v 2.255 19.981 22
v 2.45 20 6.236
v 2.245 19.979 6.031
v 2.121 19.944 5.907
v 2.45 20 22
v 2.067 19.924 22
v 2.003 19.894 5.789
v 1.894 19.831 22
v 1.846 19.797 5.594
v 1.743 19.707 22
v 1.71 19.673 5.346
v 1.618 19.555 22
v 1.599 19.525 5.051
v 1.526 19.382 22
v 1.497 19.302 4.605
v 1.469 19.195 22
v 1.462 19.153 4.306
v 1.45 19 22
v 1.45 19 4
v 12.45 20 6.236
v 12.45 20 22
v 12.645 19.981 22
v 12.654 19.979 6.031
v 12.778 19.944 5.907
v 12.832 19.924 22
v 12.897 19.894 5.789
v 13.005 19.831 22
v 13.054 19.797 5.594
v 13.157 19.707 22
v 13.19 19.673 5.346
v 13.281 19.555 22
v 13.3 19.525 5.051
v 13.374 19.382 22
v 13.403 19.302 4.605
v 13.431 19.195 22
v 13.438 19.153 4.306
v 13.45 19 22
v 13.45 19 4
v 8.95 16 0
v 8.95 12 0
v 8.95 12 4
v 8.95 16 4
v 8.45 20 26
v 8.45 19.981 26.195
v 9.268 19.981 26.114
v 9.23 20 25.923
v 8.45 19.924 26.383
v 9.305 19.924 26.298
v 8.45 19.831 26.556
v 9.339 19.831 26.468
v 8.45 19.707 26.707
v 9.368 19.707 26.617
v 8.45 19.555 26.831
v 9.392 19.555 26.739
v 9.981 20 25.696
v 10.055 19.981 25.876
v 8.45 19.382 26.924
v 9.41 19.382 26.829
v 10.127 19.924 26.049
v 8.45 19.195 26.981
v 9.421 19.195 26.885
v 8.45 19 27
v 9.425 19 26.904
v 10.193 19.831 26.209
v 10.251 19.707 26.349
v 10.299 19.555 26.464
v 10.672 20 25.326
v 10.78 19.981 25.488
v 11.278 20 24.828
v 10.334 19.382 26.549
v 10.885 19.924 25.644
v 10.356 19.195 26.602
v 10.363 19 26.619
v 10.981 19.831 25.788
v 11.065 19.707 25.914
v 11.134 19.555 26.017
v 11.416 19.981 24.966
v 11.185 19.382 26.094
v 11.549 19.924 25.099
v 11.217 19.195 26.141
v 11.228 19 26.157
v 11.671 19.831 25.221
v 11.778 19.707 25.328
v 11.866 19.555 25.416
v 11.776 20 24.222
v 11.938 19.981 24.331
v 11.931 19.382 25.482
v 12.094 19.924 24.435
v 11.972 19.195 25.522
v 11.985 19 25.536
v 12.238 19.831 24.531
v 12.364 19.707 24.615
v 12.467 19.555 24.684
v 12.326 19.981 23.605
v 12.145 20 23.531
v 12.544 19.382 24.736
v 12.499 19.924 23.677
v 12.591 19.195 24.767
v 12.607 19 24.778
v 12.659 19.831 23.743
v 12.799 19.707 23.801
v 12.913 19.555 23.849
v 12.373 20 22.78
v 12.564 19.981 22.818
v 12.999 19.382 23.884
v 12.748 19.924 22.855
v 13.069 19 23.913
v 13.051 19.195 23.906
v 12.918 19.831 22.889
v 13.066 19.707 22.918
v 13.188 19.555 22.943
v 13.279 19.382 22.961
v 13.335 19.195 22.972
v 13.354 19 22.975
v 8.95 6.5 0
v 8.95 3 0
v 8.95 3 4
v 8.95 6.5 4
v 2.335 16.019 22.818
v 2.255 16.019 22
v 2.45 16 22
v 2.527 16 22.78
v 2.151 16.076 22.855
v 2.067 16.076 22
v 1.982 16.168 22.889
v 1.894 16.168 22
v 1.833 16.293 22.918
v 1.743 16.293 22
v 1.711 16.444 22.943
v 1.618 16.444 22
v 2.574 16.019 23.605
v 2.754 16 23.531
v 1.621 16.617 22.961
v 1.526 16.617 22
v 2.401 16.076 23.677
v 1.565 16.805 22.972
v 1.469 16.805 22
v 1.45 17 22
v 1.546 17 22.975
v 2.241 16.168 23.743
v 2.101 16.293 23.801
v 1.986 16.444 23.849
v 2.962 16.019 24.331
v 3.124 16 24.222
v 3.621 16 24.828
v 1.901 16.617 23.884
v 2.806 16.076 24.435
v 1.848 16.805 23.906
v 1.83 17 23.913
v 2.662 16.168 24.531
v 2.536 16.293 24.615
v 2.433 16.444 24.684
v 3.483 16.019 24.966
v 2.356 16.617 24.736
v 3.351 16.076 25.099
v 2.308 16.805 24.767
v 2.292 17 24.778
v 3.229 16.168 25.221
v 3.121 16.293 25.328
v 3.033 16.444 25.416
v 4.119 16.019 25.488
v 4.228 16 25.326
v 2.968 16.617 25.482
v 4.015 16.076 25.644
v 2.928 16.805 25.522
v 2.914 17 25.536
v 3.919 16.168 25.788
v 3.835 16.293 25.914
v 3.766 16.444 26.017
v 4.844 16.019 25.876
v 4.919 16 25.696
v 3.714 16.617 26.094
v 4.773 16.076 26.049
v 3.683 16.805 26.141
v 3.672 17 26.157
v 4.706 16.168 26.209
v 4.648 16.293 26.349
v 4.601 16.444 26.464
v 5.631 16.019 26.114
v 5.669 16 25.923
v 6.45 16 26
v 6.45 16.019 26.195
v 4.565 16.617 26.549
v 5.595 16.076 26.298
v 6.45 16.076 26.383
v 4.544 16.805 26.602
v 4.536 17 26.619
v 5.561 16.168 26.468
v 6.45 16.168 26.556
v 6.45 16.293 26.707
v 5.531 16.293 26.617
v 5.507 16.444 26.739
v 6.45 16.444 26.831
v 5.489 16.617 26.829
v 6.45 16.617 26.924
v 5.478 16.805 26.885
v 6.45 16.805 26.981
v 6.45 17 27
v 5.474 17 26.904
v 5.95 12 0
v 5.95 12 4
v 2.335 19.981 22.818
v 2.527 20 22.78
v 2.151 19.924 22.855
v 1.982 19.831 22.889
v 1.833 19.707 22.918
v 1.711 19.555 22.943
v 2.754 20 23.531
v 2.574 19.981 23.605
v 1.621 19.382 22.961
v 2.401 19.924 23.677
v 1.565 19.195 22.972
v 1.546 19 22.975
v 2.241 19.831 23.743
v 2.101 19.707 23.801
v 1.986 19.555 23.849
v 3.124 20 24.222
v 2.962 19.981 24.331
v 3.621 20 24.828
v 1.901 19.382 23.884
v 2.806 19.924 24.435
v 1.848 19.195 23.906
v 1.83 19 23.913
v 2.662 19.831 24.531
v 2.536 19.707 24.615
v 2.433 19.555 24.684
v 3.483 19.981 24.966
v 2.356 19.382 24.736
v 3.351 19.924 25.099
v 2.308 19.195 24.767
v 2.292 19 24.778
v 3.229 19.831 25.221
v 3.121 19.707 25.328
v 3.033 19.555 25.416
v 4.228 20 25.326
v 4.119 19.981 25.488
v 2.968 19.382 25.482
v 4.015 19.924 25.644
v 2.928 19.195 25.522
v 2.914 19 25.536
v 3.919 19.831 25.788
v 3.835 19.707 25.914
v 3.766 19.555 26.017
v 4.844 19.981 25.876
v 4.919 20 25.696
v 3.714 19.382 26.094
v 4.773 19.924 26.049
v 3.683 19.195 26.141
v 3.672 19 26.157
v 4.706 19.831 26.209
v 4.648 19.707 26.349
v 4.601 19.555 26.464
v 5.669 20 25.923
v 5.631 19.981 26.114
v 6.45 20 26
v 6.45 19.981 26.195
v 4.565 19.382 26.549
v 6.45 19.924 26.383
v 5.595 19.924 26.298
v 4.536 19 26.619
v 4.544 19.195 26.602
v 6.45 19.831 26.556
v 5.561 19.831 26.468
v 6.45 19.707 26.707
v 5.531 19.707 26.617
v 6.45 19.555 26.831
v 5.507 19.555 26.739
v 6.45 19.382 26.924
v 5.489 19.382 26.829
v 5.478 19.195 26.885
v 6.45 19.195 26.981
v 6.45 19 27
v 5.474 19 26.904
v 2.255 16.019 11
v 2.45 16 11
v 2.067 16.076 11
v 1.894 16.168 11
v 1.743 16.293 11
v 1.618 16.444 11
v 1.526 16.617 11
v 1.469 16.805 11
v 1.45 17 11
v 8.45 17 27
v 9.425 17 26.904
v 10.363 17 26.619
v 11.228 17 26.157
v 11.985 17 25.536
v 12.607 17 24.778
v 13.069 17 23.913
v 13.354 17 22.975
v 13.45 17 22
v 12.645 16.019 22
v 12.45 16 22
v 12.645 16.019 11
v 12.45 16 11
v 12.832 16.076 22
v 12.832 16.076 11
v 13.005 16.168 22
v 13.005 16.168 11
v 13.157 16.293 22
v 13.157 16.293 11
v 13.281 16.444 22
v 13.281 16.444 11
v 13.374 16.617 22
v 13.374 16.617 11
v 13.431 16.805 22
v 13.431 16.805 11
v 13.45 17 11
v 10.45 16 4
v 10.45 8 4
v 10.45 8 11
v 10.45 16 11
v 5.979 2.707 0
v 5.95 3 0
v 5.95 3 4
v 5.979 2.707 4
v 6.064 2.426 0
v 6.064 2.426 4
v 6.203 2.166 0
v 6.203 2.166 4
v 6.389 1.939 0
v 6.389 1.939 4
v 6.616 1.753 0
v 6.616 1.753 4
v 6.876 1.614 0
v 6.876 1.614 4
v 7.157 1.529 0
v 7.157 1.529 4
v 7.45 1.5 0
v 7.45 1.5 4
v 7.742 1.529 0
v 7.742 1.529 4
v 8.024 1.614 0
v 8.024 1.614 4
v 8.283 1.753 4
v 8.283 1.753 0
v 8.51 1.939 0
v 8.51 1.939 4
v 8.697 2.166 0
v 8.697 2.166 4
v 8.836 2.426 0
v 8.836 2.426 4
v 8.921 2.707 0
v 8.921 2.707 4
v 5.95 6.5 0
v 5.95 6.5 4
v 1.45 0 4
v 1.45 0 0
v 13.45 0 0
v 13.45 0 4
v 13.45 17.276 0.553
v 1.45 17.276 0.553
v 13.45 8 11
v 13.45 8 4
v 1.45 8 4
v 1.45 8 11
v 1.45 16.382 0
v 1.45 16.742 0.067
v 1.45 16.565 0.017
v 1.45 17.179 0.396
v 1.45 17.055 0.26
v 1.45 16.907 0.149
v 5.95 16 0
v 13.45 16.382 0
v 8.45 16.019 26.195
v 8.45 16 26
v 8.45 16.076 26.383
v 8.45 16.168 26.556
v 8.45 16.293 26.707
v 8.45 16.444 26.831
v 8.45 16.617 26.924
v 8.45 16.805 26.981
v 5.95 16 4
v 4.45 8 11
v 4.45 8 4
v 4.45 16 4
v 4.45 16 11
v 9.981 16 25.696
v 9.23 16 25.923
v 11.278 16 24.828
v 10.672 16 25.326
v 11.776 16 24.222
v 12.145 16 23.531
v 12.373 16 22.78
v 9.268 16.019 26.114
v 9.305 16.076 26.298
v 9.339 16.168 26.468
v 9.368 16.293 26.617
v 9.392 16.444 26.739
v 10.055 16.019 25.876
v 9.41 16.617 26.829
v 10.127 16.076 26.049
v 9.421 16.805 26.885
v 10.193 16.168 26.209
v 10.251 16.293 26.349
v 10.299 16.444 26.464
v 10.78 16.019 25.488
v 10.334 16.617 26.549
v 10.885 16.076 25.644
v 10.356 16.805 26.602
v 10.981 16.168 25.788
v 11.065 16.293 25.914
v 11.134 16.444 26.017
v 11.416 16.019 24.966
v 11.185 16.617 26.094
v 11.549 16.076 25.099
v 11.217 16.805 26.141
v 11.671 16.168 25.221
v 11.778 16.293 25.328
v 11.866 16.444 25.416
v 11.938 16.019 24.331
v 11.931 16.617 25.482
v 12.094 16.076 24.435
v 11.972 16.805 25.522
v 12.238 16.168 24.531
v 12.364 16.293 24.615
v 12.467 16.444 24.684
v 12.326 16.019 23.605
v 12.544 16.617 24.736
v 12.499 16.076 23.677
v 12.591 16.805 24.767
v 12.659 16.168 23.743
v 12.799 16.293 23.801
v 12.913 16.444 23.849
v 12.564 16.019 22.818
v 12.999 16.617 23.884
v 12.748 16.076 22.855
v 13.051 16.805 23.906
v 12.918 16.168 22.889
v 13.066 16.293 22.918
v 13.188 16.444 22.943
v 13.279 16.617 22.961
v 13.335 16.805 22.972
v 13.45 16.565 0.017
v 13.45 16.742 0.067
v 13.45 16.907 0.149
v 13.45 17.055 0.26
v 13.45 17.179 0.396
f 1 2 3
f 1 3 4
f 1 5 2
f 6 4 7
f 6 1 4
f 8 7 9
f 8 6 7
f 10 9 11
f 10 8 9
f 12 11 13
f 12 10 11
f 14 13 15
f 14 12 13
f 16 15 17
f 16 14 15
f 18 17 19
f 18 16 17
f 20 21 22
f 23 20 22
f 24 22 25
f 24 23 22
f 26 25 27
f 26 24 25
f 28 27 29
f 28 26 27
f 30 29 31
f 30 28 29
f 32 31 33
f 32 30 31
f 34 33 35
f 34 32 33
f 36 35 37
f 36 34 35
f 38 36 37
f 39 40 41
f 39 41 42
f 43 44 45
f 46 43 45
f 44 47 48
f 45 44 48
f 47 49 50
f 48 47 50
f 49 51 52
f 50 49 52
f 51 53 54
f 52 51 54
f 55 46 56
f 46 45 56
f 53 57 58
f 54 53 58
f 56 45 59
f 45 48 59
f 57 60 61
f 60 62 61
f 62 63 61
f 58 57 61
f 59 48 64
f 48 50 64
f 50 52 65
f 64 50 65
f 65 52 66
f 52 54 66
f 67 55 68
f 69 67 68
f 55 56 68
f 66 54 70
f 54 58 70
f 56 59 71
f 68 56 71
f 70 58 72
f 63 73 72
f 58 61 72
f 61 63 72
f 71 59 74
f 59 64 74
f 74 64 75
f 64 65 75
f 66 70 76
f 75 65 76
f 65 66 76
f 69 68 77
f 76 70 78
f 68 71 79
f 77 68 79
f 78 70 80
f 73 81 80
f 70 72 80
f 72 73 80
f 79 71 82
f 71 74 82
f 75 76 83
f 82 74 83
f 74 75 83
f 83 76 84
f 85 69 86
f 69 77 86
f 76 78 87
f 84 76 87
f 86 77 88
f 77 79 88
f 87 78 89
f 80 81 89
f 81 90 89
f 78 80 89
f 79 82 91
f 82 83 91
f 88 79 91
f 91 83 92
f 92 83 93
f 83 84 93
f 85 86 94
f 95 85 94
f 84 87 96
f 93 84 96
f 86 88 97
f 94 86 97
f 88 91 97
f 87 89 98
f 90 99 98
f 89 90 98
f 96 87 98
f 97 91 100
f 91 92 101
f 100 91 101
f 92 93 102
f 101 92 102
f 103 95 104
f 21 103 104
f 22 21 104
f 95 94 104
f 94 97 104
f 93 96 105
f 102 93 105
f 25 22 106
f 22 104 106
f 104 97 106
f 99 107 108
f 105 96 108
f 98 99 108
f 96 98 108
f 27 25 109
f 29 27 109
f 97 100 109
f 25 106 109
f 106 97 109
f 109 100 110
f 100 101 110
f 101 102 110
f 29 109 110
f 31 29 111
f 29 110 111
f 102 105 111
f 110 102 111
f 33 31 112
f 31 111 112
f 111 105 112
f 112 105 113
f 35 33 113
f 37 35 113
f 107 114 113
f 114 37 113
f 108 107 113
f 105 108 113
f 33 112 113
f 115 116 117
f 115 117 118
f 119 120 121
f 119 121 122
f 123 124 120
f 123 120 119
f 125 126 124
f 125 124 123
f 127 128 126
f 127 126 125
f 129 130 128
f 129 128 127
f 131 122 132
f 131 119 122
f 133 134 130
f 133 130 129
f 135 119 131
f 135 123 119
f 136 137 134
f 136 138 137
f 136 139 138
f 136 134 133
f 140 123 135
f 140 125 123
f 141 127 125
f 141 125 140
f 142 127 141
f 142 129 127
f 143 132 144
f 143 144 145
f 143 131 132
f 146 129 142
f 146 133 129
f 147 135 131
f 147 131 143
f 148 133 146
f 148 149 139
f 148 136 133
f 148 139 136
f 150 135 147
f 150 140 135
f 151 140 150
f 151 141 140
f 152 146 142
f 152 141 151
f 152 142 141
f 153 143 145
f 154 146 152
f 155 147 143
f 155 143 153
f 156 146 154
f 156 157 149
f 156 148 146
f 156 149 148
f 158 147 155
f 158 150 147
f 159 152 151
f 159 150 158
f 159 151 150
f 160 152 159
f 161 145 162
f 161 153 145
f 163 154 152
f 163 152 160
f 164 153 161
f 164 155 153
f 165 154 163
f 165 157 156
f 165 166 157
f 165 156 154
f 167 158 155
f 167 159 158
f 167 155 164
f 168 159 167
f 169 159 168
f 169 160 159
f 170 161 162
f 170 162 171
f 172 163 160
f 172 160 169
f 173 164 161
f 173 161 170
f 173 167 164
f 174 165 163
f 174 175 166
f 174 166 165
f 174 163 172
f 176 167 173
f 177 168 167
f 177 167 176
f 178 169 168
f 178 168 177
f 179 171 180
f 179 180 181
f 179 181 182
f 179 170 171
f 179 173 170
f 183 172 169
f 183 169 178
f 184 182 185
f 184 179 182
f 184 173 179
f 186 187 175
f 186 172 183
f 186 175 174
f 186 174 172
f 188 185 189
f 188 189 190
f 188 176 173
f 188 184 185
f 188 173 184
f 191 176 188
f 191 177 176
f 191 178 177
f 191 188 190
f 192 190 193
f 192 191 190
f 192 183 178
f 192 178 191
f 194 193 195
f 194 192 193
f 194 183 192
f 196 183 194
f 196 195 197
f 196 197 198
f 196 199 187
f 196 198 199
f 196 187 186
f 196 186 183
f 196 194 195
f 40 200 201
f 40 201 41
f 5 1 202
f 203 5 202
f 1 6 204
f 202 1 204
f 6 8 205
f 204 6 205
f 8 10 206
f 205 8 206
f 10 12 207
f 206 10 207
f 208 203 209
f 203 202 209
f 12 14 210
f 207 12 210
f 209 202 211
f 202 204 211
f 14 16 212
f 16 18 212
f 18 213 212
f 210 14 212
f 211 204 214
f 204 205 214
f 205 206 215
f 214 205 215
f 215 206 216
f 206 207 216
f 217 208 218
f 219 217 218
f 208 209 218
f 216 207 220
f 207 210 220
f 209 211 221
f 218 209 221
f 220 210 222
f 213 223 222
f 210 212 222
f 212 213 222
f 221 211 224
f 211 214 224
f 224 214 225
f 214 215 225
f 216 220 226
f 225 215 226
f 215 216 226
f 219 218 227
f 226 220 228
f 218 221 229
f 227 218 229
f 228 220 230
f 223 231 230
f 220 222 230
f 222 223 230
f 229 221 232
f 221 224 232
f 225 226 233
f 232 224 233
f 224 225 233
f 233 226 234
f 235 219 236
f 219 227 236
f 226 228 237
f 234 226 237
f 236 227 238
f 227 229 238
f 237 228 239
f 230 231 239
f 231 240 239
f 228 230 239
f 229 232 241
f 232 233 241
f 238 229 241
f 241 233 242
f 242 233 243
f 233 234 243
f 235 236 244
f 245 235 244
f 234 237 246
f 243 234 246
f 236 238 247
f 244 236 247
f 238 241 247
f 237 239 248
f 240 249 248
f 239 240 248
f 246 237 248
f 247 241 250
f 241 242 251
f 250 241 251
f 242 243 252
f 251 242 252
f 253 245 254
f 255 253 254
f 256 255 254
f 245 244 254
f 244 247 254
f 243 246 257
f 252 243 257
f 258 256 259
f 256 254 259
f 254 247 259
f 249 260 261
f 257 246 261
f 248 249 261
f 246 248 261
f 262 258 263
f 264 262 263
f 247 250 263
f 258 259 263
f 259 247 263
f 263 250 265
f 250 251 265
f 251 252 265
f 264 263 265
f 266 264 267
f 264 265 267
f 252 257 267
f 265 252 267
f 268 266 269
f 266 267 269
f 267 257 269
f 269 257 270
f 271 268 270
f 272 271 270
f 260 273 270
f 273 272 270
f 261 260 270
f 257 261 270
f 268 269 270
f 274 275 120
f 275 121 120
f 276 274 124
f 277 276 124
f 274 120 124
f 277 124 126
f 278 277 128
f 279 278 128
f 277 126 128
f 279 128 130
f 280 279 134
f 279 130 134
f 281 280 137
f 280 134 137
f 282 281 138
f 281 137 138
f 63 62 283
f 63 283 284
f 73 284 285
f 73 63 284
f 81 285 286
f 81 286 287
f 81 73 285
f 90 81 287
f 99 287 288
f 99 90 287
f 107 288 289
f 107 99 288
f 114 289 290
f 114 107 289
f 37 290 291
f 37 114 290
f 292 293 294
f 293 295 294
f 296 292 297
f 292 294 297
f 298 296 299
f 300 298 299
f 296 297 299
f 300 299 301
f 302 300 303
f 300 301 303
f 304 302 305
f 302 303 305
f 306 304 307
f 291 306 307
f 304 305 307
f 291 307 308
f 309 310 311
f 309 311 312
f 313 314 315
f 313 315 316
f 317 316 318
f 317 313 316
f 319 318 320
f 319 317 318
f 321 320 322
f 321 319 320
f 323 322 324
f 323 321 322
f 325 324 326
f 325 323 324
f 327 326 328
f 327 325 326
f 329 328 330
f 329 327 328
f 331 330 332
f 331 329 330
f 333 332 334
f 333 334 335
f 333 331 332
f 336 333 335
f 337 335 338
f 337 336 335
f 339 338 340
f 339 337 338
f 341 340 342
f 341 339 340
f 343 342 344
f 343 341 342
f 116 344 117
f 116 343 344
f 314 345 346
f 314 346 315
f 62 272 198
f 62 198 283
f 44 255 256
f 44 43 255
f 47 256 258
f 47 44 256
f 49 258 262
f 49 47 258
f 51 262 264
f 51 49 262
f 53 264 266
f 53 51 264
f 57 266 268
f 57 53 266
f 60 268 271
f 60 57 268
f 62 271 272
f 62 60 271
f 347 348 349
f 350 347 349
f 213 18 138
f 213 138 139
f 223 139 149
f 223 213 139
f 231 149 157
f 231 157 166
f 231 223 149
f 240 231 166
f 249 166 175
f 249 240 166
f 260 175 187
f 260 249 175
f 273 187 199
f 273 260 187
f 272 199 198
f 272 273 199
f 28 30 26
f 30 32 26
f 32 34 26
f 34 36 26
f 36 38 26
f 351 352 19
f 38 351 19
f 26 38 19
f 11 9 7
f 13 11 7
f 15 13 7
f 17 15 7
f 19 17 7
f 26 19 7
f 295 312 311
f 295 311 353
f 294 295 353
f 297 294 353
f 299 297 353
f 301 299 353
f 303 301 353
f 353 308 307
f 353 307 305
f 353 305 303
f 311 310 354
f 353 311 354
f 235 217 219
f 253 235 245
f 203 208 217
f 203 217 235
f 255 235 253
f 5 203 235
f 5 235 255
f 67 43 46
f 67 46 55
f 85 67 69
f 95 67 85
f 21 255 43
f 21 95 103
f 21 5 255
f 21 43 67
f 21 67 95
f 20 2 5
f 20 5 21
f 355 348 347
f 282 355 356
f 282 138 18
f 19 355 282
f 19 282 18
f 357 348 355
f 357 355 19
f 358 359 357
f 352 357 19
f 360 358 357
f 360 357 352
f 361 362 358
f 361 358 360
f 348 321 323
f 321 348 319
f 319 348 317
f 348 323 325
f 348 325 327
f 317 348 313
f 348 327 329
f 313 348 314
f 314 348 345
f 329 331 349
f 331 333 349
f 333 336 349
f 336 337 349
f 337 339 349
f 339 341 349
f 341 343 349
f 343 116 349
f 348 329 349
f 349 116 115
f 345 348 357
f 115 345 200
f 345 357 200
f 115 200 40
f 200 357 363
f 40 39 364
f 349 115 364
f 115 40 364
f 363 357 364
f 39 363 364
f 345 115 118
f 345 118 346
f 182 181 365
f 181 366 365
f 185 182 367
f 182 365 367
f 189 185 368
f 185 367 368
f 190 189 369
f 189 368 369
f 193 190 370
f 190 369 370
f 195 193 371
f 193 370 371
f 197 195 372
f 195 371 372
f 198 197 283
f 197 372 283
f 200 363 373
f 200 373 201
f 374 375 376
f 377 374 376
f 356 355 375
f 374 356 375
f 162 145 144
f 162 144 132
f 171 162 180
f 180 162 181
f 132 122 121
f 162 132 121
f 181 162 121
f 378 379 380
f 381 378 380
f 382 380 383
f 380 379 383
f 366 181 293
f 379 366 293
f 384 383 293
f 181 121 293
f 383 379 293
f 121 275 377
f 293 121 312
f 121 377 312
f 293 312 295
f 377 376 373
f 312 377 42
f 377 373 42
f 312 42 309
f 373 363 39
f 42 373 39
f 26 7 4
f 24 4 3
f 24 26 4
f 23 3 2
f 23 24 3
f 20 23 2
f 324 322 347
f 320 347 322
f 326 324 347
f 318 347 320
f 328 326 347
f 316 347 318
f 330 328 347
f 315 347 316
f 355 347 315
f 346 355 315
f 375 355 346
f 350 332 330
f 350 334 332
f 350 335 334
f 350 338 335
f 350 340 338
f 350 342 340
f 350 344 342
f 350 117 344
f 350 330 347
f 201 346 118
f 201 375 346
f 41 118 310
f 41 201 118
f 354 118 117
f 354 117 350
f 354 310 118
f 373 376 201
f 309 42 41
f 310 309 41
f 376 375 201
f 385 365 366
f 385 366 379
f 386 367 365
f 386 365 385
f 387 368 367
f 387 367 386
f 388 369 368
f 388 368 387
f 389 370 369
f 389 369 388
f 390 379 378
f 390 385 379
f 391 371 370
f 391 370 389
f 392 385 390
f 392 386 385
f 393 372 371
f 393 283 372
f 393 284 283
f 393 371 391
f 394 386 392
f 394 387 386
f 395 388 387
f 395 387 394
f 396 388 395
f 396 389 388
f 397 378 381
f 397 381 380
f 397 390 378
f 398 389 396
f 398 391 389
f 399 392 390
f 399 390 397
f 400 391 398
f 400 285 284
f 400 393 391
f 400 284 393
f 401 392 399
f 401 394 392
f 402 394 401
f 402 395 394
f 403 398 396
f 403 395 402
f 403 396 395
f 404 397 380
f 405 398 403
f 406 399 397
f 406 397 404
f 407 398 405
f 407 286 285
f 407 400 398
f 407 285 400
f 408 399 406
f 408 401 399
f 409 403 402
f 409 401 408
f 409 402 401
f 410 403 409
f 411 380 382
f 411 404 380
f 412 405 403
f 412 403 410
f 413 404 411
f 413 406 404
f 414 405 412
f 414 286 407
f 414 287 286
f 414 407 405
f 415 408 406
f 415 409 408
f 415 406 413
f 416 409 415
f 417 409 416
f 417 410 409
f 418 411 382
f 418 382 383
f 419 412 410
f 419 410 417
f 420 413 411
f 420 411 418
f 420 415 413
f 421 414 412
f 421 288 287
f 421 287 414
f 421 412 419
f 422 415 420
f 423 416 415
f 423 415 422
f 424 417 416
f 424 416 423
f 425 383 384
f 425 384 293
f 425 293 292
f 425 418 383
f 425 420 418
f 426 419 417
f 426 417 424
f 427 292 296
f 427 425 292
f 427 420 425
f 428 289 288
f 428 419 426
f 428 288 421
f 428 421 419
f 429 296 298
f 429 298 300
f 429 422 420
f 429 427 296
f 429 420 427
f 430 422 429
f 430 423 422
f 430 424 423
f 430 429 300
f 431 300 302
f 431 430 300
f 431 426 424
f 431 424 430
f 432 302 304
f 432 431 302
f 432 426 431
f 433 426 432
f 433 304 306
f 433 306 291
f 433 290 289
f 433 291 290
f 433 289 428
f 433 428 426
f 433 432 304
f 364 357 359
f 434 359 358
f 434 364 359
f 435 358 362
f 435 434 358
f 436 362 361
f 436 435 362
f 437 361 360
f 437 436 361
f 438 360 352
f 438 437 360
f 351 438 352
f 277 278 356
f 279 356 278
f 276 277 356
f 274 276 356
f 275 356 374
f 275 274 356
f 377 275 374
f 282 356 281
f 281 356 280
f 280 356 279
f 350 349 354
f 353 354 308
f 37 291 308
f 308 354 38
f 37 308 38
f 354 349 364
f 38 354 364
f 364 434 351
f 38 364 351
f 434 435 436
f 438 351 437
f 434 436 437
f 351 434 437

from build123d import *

# Parameters (mm, degrees)
SKETCH_2_W          = 12
SKETCH_2_H          = 20
EXTRUDE_1_DEPTH     = 4
EXTRUDE_START       = -4
SKETCH_3_W          = 12
SKETCH_3_H          = 4
EXTRUDE_2_DEPTH     = 27
SKETCH_4_W          = 3
SKETCH_4_H          = 8
EXTRUDE_3_DEPTH     = 7
FILLET_5_R          = 5
CUT_EXTRUDE_2_DEPTH = 36.678984208
FILLET_6_R          = 1


with BuildPart() as part:
    # 草图2 → 凸台-拉伸1 (new body)
    with BuildSketch(Plane.XY):
        with Locations((7.449786368, 9.999747852)):
            Rectangle(SKETCH_2_W, SKETCH_2_H)
        with BuildLine():
            Line((5.949786368, 6.499747852), (5.949786368, 2.999747852))
            ThreePointArc((5.949786368, 2.999747852), (7.449786368, 1.499747852), (8.949786368, 2.999747852))
            Line((8.949786368, 2.999747852), (8.949786368, 6.499747852))
            Line((8.949786368, 6.499747852), (5.949786368, 6.499747852))
        make_face(mode=Mode.SUBTRACT)
        with BuildLine():
            Line((5.949786368, 11.999747852), (8.949786368, 11.999747852))
            Line((8.949786368, 11.999747852), (8.949786368, 16.999747852))
            ThreePointArc((8.949786368, 16.999747852), (7.449786368, 18.499747852), (5.949786368, 16.999747852))
            Line((5.949786368, 16.999747852), (5.949786368, 11.999747852))
        make_face(mode=Mode.SUBTRACT)
    extrude(amount=EXTRUDE_1_DEPTH)

    # 草图3 → 凸台-拉伸2 (add)
    with BuildSketch(Plane.XY.offset(4).offset(EXTRUDE_START)):
        with Locations((7.449786368, 17.999747852)):
            Rectangle(SKETCH_3_W, SKETCH_3_H)
    extrude(amount=EXTRUDE_2_DEPTH)

    # 草图4 → 凸台-拉伸3 (add)
    with BuildSketch(Plane.XY.offset(4)):
        with Locations((2.949786368, 11.999747852)):
            Rectangle(SKETCH_4_W, SKETCH_4_H)
        with Locations((11.949786368, 11.999747852)):
            Rectangle(SKETCH_4_W, SKETCH_4_H)
    extrude(amount=EXTRUDE_3_DEPTH)

    # 圆角5
    fillet_5_edges = [part.edges().sort_by_distance(p)[0] for p in [
        (1.449786368, 17.999747852, 27),
        (13.449786368, 17.999747852, 27),
    ]]
    fillet(fillet_5_edges, radius=FILLET_5_R)

    # 草图8 → 切除-拉伸2 (cut, through all)
    with BuildSketch(Plane.ZY.offset(-1.449786368)):
        Polygon((0, 16.999747852), (6, 19.999747852), (0, 19.999747852), align=None)
    extrude(amount=-CUT_EXTRUDE_2_DEPTH, mode=Mode.SUBTRACT)

    # 圆角6
    fillet_6_edges = [part.edges().sort_by_distance(p)[0] for p in [
        (11.985320274, 15.999747852, 25.535533906),
        (7.449786368, 16.999747852, 0),
        (7.449786368, 19.999747852, 6),
        (1.449786368, 15.999747852, 16.5),
        (13.449786368, 15.999747852, 16.5),
        (7.449786368, 15.999747852, 27),
        (7.449786368, 19.999747852, 27),
        (1.449786368, 19.999747852, 14),
        (13.449786368, 19.999747852, 14),
        (2.914252462, 19.999747852, 25.535533906),
        (11.985320274, 19.999747852, 25.535533906),
        (2.914252462, 15.999747852, 25.535533906),
    ]]
    fillet(fillet_6_edges, radius=FILLET_6_R)


solid = part.part
